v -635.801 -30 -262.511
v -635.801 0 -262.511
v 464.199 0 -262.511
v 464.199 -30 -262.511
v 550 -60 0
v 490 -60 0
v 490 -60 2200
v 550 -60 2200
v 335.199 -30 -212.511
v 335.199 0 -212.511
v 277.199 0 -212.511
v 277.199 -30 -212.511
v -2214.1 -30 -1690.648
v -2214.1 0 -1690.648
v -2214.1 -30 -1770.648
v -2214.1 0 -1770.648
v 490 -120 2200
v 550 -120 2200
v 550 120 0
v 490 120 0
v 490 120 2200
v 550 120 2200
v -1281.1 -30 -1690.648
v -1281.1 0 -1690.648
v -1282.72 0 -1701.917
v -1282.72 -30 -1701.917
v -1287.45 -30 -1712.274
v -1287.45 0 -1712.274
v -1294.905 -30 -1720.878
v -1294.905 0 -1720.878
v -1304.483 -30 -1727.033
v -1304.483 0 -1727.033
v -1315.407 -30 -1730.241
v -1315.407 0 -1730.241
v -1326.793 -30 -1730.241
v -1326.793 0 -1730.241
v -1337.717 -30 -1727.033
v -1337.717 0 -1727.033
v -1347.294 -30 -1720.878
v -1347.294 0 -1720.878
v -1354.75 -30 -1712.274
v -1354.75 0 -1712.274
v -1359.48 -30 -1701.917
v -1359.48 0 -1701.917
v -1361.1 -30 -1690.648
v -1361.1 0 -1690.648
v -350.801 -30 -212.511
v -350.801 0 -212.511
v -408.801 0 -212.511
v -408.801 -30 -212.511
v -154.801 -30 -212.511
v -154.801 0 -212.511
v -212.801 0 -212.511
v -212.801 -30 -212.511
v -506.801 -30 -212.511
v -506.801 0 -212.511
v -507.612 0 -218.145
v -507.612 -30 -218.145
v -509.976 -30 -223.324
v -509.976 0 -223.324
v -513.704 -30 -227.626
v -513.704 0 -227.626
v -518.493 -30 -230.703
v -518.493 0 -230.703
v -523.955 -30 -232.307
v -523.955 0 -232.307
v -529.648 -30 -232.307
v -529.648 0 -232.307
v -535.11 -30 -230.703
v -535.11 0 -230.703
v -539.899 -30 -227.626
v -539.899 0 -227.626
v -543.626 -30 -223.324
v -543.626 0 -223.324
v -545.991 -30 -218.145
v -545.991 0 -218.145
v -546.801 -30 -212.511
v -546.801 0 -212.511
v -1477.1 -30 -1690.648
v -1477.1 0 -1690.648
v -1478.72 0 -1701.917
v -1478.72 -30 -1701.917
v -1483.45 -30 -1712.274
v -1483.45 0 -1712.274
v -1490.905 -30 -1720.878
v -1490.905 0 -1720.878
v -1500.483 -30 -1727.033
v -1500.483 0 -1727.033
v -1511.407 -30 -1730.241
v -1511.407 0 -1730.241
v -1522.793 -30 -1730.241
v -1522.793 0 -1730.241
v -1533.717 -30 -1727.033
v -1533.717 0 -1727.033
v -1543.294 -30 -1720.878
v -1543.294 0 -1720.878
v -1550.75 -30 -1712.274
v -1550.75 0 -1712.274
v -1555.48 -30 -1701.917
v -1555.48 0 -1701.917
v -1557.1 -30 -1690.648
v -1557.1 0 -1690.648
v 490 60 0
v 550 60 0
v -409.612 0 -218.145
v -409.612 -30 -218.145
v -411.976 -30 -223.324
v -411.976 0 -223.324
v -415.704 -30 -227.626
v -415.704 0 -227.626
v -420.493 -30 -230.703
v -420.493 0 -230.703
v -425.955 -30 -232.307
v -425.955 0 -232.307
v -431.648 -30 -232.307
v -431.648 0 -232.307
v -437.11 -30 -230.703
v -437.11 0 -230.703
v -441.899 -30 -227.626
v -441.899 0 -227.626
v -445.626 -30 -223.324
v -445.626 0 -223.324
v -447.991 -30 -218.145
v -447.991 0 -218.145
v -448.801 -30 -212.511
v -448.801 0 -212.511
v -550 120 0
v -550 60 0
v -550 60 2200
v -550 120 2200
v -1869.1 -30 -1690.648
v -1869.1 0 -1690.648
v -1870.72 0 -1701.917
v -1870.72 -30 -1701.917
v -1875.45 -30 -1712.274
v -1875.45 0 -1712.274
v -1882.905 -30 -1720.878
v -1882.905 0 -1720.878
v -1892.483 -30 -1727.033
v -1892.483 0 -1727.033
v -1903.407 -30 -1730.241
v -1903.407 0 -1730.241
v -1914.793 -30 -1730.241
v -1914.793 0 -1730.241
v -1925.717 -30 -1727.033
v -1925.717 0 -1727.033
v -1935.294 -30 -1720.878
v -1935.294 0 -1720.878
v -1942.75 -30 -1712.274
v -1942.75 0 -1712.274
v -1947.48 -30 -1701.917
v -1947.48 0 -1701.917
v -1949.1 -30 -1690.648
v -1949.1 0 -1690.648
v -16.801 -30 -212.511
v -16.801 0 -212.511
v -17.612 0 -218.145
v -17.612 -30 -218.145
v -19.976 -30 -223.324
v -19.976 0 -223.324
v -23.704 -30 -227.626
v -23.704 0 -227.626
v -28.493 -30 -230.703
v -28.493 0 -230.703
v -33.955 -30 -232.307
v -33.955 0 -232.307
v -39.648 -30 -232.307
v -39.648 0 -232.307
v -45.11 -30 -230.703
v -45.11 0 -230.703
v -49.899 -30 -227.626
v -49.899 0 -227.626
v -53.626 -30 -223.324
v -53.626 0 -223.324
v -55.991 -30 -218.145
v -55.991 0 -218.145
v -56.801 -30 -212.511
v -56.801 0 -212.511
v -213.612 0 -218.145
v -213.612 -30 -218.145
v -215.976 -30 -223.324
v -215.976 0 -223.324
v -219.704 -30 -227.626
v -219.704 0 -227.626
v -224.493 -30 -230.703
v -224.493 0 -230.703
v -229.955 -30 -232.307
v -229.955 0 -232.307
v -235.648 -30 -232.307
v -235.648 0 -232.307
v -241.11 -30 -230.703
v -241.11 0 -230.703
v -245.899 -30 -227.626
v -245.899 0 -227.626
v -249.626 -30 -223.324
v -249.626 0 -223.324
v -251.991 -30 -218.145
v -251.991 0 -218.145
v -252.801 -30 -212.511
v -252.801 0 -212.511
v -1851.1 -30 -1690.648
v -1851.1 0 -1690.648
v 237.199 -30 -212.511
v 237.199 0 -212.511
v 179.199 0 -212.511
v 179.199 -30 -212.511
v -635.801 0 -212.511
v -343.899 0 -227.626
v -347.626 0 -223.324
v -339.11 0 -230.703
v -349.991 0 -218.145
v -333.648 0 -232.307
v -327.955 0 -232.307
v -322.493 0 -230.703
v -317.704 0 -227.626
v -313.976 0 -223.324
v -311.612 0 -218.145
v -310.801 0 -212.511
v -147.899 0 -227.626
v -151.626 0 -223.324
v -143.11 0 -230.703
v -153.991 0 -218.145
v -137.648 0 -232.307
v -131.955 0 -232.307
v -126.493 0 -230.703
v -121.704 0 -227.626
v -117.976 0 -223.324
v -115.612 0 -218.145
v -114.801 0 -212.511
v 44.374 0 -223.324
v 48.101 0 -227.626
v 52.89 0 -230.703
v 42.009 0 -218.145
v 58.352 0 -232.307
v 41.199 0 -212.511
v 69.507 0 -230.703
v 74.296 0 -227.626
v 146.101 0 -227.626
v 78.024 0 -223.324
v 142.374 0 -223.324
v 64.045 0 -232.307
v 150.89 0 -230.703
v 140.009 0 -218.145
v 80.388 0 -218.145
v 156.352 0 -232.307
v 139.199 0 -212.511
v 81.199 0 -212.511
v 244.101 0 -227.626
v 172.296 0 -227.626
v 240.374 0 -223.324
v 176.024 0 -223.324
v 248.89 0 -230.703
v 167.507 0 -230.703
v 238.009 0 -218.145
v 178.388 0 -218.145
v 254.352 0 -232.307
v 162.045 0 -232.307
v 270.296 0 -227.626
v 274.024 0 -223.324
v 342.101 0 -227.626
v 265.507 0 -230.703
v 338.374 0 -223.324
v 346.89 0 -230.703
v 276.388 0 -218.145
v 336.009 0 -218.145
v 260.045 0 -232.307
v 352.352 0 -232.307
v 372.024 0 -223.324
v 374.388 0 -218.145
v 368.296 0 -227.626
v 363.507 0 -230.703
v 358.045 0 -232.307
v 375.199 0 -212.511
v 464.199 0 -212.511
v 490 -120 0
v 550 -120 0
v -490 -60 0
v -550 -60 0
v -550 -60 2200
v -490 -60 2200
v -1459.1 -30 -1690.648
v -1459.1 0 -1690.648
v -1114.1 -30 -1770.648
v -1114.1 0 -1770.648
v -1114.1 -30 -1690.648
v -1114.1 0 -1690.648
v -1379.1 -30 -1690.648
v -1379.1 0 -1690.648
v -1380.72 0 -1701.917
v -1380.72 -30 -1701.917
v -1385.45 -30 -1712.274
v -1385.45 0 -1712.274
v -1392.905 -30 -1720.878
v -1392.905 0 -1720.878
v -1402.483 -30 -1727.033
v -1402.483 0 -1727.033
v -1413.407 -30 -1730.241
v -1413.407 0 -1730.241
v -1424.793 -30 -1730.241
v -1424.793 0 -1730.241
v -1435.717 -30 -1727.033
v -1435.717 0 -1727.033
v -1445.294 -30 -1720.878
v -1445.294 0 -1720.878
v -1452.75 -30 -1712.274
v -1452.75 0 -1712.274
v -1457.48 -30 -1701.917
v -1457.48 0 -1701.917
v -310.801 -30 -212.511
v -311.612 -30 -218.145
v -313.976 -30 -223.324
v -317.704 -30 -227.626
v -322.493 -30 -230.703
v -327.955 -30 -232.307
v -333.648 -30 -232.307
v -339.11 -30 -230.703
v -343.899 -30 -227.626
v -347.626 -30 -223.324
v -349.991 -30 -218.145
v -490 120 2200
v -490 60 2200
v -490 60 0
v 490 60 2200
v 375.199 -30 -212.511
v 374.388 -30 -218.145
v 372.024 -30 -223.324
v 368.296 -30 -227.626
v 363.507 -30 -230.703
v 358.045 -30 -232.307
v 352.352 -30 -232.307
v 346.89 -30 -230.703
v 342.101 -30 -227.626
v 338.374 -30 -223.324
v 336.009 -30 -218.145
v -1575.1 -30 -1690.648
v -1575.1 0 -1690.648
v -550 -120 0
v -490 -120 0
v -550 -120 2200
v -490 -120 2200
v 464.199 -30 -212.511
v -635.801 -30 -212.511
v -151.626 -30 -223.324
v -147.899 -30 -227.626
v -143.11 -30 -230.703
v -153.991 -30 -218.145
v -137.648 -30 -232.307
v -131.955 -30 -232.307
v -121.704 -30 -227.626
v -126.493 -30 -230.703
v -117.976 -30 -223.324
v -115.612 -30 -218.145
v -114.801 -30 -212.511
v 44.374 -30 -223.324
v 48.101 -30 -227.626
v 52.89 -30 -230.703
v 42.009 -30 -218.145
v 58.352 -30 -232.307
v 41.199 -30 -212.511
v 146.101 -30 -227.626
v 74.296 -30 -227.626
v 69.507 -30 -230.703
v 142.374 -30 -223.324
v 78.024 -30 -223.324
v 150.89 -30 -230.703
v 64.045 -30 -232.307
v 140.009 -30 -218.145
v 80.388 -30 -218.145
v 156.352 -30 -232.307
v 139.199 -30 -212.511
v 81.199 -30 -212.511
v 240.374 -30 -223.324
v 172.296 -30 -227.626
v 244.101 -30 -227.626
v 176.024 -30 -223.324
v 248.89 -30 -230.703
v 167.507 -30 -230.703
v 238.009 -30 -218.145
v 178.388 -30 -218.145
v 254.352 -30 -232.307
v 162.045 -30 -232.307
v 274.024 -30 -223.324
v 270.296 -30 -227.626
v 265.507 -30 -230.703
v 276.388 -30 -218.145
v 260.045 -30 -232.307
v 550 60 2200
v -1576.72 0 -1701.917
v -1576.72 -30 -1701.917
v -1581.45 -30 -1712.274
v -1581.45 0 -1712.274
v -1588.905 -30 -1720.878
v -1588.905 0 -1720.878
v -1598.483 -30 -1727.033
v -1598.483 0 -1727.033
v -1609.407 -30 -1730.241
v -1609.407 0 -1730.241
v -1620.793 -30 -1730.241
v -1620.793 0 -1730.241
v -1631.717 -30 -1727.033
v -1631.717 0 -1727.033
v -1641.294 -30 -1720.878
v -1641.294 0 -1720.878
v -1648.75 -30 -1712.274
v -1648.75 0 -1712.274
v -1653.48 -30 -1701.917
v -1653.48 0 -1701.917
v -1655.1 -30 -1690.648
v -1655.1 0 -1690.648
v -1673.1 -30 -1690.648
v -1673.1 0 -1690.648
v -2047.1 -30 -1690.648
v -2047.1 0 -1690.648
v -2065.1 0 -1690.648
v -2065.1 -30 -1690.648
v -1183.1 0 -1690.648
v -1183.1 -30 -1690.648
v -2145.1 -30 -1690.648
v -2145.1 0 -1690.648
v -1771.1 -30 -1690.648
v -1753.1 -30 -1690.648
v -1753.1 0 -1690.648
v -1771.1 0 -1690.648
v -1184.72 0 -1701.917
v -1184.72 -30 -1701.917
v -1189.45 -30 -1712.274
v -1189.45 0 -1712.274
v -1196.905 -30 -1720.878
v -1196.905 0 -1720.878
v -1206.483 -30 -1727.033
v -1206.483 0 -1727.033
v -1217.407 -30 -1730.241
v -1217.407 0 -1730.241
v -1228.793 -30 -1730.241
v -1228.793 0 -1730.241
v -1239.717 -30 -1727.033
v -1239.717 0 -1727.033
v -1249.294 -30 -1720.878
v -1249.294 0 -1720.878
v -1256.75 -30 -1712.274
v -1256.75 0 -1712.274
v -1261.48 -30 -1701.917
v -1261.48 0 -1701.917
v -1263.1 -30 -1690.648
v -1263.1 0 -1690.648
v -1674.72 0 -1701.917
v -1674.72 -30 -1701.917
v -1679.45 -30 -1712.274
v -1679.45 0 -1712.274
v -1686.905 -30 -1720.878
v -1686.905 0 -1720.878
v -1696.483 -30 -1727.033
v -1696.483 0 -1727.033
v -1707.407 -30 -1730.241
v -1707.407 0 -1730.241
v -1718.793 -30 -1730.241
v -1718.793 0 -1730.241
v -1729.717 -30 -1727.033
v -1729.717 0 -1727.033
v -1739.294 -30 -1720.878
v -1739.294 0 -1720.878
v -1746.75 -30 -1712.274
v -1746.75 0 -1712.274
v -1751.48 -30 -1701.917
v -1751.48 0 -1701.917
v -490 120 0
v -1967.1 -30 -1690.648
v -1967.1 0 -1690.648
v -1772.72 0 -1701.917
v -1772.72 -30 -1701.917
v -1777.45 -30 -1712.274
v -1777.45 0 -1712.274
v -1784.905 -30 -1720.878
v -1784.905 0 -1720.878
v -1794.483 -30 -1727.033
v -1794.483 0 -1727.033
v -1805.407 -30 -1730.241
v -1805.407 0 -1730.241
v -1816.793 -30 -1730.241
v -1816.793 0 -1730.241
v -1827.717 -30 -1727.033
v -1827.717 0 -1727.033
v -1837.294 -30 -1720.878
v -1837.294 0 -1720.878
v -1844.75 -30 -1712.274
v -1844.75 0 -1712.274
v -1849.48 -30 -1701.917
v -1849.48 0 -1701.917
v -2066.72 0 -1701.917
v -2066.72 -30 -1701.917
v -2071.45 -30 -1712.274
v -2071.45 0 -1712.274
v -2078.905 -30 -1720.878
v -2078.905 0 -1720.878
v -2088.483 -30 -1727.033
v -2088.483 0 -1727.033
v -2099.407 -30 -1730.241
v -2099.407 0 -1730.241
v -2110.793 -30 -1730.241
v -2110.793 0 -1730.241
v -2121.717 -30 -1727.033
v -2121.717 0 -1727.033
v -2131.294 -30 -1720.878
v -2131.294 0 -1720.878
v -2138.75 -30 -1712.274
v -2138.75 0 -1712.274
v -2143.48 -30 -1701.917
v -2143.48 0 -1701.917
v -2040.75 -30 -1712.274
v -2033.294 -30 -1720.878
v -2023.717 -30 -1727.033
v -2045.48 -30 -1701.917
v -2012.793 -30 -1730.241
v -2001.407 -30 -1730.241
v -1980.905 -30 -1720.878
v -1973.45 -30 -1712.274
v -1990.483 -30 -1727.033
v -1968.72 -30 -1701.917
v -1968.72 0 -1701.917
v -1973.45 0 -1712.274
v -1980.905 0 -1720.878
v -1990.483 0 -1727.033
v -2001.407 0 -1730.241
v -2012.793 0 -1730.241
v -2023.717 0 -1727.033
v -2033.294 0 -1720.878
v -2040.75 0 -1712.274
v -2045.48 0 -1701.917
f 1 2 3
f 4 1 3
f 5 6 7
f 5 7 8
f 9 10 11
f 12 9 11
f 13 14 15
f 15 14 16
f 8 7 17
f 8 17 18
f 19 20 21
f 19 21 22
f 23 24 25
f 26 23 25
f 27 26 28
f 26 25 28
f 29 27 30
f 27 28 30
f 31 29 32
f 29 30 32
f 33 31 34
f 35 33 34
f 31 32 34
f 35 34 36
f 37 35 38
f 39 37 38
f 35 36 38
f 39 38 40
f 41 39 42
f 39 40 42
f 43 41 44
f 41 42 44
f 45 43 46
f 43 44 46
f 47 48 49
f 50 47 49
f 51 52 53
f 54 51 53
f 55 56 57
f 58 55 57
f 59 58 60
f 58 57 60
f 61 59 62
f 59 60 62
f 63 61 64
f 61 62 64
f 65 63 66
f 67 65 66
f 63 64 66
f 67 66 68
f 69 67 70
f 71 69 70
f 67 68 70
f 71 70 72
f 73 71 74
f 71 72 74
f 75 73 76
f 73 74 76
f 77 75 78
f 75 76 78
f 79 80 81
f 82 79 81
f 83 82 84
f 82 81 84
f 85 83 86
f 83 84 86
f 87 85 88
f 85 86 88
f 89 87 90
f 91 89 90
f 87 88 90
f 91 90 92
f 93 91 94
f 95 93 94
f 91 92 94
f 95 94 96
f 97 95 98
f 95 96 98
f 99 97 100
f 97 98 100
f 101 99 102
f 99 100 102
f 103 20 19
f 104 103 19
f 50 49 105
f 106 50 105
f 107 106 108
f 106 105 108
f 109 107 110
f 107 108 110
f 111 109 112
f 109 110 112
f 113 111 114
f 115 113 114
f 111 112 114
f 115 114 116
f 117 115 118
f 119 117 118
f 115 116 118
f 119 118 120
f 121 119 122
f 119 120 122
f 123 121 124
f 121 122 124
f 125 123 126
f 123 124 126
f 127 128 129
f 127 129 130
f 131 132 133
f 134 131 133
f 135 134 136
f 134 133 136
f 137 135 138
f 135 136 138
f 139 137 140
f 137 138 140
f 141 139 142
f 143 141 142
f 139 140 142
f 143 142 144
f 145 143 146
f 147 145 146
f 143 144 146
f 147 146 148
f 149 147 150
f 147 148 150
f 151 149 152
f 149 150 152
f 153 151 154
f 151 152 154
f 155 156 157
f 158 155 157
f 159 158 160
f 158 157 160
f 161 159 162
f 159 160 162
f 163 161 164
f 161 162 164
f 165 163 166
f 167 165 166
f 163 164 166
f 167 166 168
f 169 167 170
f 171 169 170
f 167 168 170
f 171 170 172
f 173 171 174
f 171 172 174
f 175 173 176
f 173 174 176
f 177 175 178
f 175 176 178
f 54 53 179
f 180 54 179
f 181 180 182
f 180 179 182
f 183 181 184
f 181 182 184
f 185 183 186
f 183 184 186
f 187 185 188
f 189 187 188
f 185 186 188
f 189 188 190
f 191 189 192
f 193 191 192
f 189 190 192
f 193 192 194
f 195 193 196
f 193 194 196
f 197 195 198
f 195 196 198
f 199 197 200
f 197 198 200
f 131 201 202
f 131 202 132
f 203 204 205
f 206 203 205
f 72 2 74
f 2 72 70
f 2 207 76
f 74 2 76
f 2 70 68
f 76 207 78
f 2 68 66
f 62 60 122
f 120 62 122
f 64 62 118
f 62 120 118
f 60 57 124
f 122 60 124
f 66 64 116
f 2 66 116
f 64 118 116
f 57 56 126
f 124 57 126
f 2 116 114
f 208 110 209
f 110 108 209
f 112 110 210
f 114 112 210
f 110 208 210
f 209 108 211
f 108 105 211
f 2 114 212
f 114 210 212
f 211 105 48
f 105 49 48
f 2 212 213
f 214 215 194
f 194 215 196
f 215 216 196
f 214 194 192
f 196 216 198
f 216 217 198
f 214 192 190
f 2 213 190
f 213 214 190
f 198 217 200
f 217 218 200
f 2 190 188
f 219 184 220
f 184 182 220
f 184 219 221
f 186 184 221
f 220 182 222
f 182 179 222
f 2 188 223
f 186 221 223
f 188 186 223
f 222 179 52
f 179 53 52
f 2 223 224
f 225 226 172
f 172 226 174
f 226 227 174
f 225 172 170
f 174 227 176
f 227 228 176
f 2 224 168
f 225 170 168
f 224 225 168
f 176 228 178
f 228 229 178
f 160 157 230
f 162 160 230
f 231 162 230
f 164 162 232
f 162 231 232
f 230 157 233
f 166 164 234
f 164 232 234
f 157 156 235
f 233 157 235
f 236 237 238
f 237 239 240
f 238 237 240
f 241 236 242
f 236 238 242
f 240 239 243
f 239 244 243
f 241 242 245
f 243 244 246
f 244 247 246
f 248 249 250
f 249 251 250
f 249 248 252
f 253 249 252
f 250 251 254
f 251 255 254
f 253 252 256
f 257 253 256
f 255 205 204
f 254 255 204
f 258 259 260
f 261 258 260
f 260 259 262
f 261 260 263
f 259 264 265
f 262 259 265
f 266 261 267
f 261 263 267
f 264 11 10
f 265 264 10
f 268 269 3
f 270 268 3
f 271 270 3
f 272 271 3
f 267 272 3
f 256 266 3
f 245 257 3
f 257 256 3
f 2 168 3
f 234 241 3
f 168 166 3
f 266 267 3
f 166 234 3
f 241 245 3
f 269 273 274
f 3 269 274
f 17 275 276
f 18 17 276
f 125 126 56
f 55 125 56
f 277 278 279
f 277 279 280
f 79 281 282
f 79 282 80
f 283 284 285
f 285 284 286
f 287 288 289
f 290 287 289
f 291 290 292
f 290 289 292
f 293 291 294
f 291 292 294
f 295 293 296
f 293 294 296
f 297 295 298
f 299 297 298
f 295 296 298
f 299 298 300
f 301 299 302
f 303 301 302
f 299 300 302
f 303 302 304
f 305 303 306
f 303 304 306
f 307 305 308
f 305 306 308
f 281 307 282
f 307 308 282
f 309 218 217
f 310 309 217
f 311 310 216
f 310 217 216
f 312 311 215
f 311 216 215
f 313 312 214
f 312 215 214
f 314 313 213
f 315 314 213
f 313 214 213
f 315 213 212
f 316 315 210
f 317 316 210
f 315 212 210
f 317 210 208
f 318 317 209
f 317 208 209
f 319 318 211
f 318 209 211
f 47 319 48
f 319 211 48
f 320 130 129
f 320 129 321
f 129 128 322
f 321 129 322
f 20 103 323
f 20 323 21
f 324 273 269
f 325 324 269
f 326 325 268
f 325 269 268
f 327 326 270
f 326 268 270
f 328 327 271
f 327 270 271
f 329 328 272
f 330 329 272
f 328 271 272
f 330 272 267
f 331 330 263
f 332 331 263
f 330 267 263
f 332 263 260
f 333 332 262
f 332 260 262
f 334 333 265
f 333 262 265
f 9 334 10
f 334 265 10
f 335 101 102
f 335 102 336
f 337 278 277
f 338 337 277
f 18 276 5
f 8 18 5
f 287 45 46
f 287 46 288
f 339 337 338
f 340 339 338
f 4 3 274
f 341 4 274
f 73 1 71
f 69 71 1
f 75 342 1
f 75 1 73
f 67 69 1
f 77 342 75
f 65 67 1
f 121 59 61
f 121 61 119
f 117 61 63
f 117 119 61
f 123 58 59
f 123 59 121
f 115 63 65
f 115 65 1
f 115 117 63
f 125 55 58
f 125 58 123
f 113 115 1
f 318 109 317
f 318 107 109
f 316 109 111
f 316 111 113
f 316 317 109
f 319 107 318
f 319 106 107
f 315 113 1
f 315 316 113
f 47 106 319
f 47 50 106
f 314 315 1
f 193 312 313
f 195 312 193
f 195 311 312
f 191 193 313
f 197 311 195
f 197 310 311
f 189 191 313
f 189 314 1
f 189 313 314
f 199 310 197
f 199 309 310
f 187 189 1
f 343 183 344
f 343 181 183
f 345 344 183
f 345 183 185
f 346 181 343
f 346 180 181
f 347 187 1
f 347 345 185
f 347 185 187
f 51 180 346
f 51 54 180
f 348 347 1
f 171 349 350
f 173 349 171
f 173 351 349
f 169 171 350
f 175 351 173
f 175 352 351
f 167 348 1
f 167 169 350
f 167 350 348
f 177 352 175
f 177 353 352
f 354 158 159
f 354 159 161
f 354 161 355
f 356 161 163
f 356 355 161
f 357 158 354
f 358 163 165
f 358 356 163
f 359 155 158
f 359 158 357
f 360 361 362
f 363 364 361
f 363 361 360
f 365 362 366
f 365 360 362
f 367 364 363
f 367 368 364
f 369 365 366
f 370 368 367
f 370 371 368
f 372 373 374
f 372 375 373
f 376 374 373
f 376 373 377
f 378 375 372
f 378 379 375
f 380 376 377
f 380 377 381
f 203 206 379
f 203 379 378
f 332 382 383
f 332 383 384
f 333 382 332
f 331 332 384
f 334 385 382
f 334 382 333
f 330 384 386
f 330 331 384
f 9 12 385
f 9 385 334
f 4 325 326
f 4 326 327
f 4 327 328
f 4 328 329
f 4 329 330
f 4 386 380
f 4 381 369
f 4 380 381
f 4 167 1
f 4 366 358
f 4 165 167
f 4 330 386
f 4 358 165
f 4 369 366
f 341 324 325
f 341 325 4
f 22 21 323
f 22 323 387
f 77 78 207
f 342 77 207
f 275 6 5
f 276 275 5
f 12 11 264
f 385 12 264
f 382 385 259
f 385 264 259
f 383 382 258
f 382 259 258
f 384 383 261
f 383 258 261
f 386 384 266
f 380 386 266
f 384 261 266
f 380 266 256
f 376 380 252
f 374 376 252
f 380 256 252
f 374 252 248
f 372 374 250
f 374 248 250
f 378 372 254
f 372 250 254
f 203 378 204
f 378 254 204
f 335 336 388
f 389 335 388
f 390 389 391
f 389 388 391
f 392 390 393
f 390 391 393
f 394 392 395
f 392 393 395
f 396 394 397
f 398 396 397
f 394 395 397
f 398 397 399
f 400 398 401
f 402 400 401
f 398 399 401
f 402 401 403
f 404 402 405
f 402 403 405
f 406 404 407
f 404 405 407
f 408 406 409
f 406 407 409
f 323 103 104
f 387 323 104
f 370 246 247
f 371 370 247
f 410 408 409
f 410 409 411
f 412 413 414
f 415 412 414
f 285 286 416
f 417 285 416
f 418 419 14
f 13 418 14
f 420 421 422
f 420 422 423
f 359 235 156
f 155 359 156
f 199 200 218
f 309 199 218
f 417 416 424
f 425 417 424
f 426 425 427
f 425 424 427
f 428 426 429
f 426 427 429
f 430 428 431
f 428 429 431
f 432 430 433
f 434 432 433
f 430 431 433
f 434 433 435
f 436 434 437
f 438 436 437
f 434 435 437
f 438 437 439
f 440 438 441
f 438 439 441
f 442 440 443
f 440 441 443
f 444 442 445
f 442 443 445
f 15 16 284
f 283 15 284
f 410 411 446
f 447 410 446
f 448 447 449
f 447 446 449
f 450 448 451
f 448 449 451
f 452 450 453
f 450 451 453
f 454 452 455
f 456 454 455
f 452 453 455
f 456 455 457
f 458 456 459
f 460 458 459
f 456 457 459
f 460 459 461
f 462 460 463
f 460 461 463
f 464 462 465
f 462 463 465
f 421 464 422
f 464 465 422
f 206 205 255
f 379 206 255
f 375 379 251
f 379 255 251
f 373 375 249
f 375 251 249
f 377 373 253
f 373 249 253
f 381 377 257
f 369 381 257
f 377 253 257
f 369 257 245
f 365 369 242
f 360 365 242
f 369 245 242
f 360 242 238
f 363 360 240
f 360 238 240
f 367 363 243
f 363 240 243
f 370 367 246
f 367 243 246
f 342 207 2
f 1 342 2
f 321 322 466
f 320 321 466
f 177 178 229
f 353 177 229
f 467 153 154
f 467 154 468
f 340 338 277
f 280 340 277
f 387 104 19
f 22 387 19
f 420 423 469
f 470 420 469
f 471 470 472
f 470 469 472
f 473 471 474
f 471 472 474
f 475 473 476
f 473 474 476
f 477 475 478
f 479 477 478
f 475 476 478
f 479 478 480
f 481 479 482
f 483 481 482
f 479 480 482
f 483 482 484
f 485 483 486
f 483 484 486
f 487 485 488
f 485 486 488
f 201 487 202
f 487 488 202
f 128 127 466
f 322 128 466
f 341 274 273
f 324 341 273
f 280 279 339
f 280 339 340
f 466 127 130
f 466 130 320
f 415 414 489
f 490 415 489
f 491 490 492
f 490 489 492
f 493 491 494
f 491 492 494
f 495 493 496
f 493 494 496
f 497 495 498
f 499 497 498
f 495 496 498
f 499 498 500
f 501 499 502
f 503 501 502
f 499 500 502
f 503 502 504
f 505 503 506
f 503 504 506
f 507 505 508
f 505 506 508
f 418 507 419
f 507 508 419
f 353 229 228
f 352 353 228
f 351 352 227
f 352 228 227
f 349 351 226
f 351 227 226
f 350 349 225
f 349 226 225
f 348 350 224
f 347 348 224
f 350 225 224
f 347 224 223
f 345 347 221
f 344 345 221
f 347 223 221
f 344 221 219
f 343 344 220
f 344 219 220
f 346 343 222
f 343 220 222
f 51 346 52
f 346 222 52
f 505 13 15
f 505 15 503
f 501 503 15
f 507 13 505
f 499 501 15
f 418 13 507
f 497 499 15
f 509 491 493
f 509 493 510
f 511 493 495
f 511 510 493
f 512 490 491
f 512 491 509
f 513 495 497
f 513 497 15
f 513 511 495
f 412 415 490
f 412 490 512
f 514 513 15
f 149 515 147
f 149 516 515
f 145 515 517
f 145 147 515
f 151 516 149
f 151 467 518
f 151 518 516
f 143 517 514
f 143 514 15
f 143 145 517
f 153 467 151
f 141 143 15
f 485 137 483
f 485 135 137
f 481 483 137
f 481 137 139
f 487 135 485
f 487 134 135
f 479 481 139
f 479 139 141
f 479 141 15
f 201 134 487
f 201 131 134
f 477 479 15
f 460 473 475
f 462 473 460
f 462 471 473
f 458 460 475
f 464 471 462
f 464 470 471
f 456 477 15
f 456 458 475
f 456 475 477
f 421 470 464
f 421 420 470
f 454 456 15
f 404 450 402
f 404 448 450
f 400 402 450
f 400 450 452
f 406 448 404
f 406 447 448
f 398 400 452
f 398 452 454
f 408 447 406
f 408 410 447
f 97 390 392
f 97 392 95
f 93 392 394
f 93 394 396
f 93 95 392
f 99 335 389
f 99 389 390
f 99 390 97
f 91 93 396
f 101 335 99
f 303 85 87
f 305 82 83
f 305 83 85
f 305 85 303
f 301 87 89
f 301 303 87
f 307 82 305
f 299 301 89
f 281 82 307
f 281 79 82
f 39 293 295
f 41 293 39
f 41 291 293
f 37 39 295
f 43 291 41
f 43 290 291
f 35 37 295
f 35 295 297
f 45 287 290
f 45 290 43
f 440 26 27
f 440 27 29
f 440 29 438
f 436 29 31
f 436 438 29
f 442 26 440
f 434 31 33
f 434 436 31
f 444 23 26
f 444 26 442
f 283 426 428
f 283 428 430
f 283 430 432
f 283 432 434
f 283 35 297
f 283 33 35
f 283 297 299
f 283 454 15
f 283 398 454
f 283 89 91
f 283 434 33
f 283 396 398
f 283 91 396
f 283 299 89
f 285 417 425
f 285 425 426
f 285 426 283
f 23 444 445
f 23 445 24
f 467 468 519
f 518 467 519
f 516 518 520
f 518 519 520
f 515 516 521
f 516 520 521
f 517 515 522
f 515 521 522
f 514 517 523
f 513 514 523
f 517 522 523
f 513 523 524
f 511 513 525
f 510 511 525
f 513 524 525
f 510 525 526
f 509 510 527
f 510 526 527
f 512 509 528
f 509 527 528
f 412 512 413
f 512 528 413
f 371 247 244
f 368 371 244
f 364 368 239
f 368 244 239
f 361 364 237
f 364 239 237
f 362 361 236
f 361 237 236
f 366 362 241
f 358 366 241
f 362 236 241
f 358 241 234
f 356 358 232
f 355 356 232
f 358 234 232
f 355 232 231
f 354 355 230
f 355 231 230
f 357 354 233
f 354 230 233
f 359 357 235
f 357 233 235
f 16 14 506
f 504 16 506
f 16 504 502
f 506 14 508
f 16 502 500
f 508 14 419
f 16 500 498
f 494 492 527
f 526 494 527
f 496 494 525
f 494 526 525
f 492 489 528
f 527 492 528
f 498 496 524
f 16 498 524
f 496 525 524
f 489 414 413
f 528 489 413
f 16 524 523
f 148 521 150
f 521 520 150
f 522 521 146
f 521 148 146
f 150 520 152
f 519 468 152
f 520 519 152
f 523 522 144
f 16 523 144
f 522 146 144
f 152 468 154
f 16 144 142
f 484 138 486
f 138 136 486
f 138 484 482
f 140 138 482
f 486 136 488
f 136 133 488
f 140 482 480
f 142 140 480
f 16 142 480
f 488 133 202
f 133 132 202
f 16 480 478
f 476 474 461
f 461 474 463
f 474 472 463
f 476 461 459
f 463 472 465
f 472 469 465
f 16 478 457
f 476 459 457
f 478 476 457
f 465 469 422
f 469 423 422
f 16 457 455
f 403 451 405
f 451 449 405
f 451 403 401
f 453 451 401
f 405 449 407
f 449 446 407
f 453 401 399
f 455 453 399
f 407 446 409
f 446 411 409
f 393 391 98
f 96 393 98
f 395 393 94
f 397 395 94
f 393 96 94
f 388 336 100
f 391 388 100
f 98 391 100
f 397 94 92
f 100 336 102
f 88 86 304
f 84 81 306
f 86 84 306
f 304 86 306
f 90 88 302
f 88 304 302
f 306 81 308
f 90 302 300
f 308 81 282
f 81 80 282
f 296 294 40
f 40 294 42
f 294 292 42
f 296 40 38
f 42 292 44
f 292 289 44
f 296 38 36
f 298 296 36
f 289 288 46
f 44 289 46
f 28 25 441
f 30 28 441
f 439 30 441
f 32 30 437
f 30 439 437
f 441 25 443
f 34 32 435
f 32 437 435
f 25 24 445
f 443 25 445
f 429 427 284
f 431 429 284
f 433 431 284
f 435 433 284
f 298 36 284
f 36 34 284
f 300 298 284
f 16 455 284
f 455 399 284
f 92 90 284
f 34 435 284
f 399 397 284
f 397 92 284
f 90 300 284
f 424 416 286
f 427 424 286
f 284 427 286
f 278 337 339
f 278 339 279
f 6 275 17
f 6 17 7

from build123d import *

# Parameters (mm, degrees)
F0_W     = 60
F0_H     = 60
F1_DEPTH = 2200
F3_DEPTH = 30


# Not quite as in the source:
# - a feature names something its author has since deleted; it is built from what else it names


with BuildPart() as f1:
    # F0 (on Top) → F1 (new body)
    with BuildSketch(Plane.XY):
        with Locations((-520, -90)):
            Rectangle(F0_W, F0_H)
    extrude(amount=F1_DEPTH)


with BuildPart() as f1b:
    # F0 (on Top) → F1, piece 2 (new body)
    with BuildSketch(Plane.XY):
        with Locations((520, -90)):
            Rectangle(F0_W, F0_H)
    extrude(amount=F1_DEPTH)


with BuildPart() as f1c:
    # F0 (on Top) → F1, piece 3 (new body)
    with BuildSketch(Plane.XY):
        with Locations((520, 90)):
            Rectangle(F0_W, F0_H)
    extrude(amount=F1_DEPTH)


with BuildPart() as f1d:
    # F0 (on Top) → F1, piece 4 (new body)
    with BuildSketch(Plane.XY):
        with Locations((-520, 90)):
            Rectangle(F0_W, F0_H)
    extrude(amount=F1_DEPTH)


with BuildPart() as f3:
    # F2 (on Front) → F3 (new body)
    with BuildSketch(Plane.XZ):
        with BuildLine():
            Line((464.1985823002, -212.5107118107), (375.1985823002, -212.5107118107))
            ThreePointArc((375.1985823002, -212.5107118107), (355.1985823002, -232.5107118107), (335.1985823002, -212.5107118107))
            Line((335.1985823002, -212.5107118107), (277.1985823002, -212.5107118107))
            ThreePointArc((277.1985823002, -212.5107118107), (257.1985823002, -232.5107118107), (237.1985823002, -212.5107118107))
            Line((237.1985823002, -212.5107118107), (179.1985823002, -212.5107118107))
            ThreePointArc((179.1985823002, -212.5107118107), (159.1985823002, -232.5107118107), (139.1985823002, -212.5107118107))
            Line((139.1985823002, -212.5107118107), (81.1985823002, -212.5107118107))
            ThreePointArc((81.1985823002, -212.5107118107), (61.1985823002, -232.5107118107), (41.1985823002, -212.5107118107))
            Line((41.1985823002, -212.5107118107), (-16.8014176998, -212.5107118107))
            ThreePointArc((-16.8014176998, -212.5107118107), (-36.8014176998, -232.5107118107), (-56.8014176998, -212.5107118107))
            Line((-56.8014176998, -212.5107118107), (-114.8014176998, -212.5107118107))
            ThreePointArc((-114.8014176998, -212.5107118107), (-134.8014176998, -232.5107118107), (-154.8014176998, -212.5107118107))
            Line((-154.8014176998, -212.5107118107), (-212.8014176998, -212.5107118107))
            ThreePointArc((-212.8014176998, -212.5107118107), (-232.8014176998, -232.5107118107), (-252.8014176998, -212.5107118107))
            Line((-252.8014176998, -212.5107118107), (-310.8014176998, -212.5107118107))
            ThreePointArc((-310.8014176998, -212.5107118107), (-330.8014176998, -232.5107118107), (-350.8014176998, -212.5107118107))
            Line((-350.8014176998, -212.5107118107), (-408.8014176998, -212.5107118107))
            ThreePointArc((-408.8014176998, -212.5107118107), (-428.8014176998, -232.5107118107), (-448.8014176998, -212.5107118107))
            Line((-448.8014176998, -212.5107118107), (-506.8014176998, -212.5107118107))
            ThreePointArc((-506.8014176998, -212.5107118107), (-526.8014176998, -232.5107118107), (-546.8014176998, -212.5107118107))
            Line((-546.8014176998, -212.5107118107), (-635.8014176998, -212.5107118107))
            Line((-635.8014176998, -212.5107118107), (-635.8014176998, -262.5107118107))
            Line((-635.8014176998, -262.5107118107), (464.1985823002, -262.5107118107))
            Line((464.1985823002, -262.5107118107), (464.1985823002, -212.5107118107))
        make_face()
    extrude(amount=F3_DEPTH)


with BuildPart() as f3b:
    # F2 (on Front) → F3, piece 2 (new body)
    with BuildSketch(Plane.XZ):
        with BuildLine():
            Line((-1114.0999228668, -1690.6479753494), (-1183.0999228668, -1690.6479753494))
            ThreePointArc((-1183.0999228668, -1690.6479753494), (-1223.0999228668, -1730.6479753494), (-1263.0999228668, -1690.6479753494))
            Line((-1263.0999228668, -1690.6479753494), (-1281.0999228668, -1690.6479753494))
            ThreePointArc((-1281.0999228668, -1690.6479753494), (-1321.0999228668, -1730.6479753494), (-1361.0999228668, -1690.6479753494))
            Line((-1361.0999228668, -1690.6479753494), (-1379.0999228668, -1690.6479753494))
            ThreePointArc((-1379.0999228668, -1690.6479753494), (-1419.0999228668, -1730.6479753494), (-1459.0999228668, -1690.6479753494))
            Line((-1459.0999228668, -1690.6479753494), (-1477.0999228668, -1690.6479753494))
            ThreePointArc((-1477.0999228668, -1690.6479753494), (-1517.0999228668, -1730.6479753494), (-1557.0999228668, -1690.6479753494))
            Line((-1557.0999228668, -1690.6479753494), (-1575.0999228668, -1690.6479753494))
            ThreePointArc((-1575.0999228668, -1690.6479753494), (-1615.0999228668, -1730.6479753494), (-1655.0999228668, -1690.6479753494))
            Line((-1655.0999228668, -1690.6479753494), (-1673.0999228668, -1690.6479753494))
            ThreePointArc((-1673.0999228668, -1690.6479753494), (-1713.0999228668, -1730.6479753494), (-1753.0999228668, -1690.6479753494))
            Line((-1753.0999228668, -1690.6479753494), (-1771.0999228668, -1690.6479753494))
            ThreePointArc((-1771.0999228668, -1690.6479753494), (-1811.0999228668, -1730.6479753494), (-1851.0999228668, -1690.6479753494))
            Line((-1851.0999228668, -1690.6479753494), (-1869.0999228668, -1690.6479753494))
            ThreePointArc((-1869.0999228668, -1690.6479753494), (-1909.0999228668, -1730.6479753494), (-1949.0999228668, -1690.6479753494))
            Line((-1949.0999228668, -1690.6479753494), (-1967.0999228668, -1690.6479753494))
            ThreePointArc((-1967.0999228668, -1690.6479753494), (-2007.0999228668, -1730.6479753494), (-2047.0999228668, -1690.6479753494))
            Line((-2047.0999228668, -1690.6479753494), (-2065.0999228668, -1690.6479753494))
            ThreePointArc((-2065.0999228668, -1690.6479753494), (-2105.0999228668, -1730.6479753494), (-2145.0999228668, -1690.6479753494))
            Line((-2145.0999228668, -1690.6479753494), (-2214.0999228668, -1690.6479753494))
            Line((-2214.0999228668, -1690.6479753494), (-2214.0999228668, -1770.6479753494))
            Line((-2214.0999228668, -1770.6479753494), (-1114.0999228668, -1770.6479753494))
            Line((-1114.0999228668, -1770.6479753494), (-1114.0999228668, -1690.6479753494))
        make_face()
    extrude(amount=F3_DEPTH)


solid = Compound([f1.part, f1b.part, f1c.part, f1d.part, f3.part, f3b.part])
